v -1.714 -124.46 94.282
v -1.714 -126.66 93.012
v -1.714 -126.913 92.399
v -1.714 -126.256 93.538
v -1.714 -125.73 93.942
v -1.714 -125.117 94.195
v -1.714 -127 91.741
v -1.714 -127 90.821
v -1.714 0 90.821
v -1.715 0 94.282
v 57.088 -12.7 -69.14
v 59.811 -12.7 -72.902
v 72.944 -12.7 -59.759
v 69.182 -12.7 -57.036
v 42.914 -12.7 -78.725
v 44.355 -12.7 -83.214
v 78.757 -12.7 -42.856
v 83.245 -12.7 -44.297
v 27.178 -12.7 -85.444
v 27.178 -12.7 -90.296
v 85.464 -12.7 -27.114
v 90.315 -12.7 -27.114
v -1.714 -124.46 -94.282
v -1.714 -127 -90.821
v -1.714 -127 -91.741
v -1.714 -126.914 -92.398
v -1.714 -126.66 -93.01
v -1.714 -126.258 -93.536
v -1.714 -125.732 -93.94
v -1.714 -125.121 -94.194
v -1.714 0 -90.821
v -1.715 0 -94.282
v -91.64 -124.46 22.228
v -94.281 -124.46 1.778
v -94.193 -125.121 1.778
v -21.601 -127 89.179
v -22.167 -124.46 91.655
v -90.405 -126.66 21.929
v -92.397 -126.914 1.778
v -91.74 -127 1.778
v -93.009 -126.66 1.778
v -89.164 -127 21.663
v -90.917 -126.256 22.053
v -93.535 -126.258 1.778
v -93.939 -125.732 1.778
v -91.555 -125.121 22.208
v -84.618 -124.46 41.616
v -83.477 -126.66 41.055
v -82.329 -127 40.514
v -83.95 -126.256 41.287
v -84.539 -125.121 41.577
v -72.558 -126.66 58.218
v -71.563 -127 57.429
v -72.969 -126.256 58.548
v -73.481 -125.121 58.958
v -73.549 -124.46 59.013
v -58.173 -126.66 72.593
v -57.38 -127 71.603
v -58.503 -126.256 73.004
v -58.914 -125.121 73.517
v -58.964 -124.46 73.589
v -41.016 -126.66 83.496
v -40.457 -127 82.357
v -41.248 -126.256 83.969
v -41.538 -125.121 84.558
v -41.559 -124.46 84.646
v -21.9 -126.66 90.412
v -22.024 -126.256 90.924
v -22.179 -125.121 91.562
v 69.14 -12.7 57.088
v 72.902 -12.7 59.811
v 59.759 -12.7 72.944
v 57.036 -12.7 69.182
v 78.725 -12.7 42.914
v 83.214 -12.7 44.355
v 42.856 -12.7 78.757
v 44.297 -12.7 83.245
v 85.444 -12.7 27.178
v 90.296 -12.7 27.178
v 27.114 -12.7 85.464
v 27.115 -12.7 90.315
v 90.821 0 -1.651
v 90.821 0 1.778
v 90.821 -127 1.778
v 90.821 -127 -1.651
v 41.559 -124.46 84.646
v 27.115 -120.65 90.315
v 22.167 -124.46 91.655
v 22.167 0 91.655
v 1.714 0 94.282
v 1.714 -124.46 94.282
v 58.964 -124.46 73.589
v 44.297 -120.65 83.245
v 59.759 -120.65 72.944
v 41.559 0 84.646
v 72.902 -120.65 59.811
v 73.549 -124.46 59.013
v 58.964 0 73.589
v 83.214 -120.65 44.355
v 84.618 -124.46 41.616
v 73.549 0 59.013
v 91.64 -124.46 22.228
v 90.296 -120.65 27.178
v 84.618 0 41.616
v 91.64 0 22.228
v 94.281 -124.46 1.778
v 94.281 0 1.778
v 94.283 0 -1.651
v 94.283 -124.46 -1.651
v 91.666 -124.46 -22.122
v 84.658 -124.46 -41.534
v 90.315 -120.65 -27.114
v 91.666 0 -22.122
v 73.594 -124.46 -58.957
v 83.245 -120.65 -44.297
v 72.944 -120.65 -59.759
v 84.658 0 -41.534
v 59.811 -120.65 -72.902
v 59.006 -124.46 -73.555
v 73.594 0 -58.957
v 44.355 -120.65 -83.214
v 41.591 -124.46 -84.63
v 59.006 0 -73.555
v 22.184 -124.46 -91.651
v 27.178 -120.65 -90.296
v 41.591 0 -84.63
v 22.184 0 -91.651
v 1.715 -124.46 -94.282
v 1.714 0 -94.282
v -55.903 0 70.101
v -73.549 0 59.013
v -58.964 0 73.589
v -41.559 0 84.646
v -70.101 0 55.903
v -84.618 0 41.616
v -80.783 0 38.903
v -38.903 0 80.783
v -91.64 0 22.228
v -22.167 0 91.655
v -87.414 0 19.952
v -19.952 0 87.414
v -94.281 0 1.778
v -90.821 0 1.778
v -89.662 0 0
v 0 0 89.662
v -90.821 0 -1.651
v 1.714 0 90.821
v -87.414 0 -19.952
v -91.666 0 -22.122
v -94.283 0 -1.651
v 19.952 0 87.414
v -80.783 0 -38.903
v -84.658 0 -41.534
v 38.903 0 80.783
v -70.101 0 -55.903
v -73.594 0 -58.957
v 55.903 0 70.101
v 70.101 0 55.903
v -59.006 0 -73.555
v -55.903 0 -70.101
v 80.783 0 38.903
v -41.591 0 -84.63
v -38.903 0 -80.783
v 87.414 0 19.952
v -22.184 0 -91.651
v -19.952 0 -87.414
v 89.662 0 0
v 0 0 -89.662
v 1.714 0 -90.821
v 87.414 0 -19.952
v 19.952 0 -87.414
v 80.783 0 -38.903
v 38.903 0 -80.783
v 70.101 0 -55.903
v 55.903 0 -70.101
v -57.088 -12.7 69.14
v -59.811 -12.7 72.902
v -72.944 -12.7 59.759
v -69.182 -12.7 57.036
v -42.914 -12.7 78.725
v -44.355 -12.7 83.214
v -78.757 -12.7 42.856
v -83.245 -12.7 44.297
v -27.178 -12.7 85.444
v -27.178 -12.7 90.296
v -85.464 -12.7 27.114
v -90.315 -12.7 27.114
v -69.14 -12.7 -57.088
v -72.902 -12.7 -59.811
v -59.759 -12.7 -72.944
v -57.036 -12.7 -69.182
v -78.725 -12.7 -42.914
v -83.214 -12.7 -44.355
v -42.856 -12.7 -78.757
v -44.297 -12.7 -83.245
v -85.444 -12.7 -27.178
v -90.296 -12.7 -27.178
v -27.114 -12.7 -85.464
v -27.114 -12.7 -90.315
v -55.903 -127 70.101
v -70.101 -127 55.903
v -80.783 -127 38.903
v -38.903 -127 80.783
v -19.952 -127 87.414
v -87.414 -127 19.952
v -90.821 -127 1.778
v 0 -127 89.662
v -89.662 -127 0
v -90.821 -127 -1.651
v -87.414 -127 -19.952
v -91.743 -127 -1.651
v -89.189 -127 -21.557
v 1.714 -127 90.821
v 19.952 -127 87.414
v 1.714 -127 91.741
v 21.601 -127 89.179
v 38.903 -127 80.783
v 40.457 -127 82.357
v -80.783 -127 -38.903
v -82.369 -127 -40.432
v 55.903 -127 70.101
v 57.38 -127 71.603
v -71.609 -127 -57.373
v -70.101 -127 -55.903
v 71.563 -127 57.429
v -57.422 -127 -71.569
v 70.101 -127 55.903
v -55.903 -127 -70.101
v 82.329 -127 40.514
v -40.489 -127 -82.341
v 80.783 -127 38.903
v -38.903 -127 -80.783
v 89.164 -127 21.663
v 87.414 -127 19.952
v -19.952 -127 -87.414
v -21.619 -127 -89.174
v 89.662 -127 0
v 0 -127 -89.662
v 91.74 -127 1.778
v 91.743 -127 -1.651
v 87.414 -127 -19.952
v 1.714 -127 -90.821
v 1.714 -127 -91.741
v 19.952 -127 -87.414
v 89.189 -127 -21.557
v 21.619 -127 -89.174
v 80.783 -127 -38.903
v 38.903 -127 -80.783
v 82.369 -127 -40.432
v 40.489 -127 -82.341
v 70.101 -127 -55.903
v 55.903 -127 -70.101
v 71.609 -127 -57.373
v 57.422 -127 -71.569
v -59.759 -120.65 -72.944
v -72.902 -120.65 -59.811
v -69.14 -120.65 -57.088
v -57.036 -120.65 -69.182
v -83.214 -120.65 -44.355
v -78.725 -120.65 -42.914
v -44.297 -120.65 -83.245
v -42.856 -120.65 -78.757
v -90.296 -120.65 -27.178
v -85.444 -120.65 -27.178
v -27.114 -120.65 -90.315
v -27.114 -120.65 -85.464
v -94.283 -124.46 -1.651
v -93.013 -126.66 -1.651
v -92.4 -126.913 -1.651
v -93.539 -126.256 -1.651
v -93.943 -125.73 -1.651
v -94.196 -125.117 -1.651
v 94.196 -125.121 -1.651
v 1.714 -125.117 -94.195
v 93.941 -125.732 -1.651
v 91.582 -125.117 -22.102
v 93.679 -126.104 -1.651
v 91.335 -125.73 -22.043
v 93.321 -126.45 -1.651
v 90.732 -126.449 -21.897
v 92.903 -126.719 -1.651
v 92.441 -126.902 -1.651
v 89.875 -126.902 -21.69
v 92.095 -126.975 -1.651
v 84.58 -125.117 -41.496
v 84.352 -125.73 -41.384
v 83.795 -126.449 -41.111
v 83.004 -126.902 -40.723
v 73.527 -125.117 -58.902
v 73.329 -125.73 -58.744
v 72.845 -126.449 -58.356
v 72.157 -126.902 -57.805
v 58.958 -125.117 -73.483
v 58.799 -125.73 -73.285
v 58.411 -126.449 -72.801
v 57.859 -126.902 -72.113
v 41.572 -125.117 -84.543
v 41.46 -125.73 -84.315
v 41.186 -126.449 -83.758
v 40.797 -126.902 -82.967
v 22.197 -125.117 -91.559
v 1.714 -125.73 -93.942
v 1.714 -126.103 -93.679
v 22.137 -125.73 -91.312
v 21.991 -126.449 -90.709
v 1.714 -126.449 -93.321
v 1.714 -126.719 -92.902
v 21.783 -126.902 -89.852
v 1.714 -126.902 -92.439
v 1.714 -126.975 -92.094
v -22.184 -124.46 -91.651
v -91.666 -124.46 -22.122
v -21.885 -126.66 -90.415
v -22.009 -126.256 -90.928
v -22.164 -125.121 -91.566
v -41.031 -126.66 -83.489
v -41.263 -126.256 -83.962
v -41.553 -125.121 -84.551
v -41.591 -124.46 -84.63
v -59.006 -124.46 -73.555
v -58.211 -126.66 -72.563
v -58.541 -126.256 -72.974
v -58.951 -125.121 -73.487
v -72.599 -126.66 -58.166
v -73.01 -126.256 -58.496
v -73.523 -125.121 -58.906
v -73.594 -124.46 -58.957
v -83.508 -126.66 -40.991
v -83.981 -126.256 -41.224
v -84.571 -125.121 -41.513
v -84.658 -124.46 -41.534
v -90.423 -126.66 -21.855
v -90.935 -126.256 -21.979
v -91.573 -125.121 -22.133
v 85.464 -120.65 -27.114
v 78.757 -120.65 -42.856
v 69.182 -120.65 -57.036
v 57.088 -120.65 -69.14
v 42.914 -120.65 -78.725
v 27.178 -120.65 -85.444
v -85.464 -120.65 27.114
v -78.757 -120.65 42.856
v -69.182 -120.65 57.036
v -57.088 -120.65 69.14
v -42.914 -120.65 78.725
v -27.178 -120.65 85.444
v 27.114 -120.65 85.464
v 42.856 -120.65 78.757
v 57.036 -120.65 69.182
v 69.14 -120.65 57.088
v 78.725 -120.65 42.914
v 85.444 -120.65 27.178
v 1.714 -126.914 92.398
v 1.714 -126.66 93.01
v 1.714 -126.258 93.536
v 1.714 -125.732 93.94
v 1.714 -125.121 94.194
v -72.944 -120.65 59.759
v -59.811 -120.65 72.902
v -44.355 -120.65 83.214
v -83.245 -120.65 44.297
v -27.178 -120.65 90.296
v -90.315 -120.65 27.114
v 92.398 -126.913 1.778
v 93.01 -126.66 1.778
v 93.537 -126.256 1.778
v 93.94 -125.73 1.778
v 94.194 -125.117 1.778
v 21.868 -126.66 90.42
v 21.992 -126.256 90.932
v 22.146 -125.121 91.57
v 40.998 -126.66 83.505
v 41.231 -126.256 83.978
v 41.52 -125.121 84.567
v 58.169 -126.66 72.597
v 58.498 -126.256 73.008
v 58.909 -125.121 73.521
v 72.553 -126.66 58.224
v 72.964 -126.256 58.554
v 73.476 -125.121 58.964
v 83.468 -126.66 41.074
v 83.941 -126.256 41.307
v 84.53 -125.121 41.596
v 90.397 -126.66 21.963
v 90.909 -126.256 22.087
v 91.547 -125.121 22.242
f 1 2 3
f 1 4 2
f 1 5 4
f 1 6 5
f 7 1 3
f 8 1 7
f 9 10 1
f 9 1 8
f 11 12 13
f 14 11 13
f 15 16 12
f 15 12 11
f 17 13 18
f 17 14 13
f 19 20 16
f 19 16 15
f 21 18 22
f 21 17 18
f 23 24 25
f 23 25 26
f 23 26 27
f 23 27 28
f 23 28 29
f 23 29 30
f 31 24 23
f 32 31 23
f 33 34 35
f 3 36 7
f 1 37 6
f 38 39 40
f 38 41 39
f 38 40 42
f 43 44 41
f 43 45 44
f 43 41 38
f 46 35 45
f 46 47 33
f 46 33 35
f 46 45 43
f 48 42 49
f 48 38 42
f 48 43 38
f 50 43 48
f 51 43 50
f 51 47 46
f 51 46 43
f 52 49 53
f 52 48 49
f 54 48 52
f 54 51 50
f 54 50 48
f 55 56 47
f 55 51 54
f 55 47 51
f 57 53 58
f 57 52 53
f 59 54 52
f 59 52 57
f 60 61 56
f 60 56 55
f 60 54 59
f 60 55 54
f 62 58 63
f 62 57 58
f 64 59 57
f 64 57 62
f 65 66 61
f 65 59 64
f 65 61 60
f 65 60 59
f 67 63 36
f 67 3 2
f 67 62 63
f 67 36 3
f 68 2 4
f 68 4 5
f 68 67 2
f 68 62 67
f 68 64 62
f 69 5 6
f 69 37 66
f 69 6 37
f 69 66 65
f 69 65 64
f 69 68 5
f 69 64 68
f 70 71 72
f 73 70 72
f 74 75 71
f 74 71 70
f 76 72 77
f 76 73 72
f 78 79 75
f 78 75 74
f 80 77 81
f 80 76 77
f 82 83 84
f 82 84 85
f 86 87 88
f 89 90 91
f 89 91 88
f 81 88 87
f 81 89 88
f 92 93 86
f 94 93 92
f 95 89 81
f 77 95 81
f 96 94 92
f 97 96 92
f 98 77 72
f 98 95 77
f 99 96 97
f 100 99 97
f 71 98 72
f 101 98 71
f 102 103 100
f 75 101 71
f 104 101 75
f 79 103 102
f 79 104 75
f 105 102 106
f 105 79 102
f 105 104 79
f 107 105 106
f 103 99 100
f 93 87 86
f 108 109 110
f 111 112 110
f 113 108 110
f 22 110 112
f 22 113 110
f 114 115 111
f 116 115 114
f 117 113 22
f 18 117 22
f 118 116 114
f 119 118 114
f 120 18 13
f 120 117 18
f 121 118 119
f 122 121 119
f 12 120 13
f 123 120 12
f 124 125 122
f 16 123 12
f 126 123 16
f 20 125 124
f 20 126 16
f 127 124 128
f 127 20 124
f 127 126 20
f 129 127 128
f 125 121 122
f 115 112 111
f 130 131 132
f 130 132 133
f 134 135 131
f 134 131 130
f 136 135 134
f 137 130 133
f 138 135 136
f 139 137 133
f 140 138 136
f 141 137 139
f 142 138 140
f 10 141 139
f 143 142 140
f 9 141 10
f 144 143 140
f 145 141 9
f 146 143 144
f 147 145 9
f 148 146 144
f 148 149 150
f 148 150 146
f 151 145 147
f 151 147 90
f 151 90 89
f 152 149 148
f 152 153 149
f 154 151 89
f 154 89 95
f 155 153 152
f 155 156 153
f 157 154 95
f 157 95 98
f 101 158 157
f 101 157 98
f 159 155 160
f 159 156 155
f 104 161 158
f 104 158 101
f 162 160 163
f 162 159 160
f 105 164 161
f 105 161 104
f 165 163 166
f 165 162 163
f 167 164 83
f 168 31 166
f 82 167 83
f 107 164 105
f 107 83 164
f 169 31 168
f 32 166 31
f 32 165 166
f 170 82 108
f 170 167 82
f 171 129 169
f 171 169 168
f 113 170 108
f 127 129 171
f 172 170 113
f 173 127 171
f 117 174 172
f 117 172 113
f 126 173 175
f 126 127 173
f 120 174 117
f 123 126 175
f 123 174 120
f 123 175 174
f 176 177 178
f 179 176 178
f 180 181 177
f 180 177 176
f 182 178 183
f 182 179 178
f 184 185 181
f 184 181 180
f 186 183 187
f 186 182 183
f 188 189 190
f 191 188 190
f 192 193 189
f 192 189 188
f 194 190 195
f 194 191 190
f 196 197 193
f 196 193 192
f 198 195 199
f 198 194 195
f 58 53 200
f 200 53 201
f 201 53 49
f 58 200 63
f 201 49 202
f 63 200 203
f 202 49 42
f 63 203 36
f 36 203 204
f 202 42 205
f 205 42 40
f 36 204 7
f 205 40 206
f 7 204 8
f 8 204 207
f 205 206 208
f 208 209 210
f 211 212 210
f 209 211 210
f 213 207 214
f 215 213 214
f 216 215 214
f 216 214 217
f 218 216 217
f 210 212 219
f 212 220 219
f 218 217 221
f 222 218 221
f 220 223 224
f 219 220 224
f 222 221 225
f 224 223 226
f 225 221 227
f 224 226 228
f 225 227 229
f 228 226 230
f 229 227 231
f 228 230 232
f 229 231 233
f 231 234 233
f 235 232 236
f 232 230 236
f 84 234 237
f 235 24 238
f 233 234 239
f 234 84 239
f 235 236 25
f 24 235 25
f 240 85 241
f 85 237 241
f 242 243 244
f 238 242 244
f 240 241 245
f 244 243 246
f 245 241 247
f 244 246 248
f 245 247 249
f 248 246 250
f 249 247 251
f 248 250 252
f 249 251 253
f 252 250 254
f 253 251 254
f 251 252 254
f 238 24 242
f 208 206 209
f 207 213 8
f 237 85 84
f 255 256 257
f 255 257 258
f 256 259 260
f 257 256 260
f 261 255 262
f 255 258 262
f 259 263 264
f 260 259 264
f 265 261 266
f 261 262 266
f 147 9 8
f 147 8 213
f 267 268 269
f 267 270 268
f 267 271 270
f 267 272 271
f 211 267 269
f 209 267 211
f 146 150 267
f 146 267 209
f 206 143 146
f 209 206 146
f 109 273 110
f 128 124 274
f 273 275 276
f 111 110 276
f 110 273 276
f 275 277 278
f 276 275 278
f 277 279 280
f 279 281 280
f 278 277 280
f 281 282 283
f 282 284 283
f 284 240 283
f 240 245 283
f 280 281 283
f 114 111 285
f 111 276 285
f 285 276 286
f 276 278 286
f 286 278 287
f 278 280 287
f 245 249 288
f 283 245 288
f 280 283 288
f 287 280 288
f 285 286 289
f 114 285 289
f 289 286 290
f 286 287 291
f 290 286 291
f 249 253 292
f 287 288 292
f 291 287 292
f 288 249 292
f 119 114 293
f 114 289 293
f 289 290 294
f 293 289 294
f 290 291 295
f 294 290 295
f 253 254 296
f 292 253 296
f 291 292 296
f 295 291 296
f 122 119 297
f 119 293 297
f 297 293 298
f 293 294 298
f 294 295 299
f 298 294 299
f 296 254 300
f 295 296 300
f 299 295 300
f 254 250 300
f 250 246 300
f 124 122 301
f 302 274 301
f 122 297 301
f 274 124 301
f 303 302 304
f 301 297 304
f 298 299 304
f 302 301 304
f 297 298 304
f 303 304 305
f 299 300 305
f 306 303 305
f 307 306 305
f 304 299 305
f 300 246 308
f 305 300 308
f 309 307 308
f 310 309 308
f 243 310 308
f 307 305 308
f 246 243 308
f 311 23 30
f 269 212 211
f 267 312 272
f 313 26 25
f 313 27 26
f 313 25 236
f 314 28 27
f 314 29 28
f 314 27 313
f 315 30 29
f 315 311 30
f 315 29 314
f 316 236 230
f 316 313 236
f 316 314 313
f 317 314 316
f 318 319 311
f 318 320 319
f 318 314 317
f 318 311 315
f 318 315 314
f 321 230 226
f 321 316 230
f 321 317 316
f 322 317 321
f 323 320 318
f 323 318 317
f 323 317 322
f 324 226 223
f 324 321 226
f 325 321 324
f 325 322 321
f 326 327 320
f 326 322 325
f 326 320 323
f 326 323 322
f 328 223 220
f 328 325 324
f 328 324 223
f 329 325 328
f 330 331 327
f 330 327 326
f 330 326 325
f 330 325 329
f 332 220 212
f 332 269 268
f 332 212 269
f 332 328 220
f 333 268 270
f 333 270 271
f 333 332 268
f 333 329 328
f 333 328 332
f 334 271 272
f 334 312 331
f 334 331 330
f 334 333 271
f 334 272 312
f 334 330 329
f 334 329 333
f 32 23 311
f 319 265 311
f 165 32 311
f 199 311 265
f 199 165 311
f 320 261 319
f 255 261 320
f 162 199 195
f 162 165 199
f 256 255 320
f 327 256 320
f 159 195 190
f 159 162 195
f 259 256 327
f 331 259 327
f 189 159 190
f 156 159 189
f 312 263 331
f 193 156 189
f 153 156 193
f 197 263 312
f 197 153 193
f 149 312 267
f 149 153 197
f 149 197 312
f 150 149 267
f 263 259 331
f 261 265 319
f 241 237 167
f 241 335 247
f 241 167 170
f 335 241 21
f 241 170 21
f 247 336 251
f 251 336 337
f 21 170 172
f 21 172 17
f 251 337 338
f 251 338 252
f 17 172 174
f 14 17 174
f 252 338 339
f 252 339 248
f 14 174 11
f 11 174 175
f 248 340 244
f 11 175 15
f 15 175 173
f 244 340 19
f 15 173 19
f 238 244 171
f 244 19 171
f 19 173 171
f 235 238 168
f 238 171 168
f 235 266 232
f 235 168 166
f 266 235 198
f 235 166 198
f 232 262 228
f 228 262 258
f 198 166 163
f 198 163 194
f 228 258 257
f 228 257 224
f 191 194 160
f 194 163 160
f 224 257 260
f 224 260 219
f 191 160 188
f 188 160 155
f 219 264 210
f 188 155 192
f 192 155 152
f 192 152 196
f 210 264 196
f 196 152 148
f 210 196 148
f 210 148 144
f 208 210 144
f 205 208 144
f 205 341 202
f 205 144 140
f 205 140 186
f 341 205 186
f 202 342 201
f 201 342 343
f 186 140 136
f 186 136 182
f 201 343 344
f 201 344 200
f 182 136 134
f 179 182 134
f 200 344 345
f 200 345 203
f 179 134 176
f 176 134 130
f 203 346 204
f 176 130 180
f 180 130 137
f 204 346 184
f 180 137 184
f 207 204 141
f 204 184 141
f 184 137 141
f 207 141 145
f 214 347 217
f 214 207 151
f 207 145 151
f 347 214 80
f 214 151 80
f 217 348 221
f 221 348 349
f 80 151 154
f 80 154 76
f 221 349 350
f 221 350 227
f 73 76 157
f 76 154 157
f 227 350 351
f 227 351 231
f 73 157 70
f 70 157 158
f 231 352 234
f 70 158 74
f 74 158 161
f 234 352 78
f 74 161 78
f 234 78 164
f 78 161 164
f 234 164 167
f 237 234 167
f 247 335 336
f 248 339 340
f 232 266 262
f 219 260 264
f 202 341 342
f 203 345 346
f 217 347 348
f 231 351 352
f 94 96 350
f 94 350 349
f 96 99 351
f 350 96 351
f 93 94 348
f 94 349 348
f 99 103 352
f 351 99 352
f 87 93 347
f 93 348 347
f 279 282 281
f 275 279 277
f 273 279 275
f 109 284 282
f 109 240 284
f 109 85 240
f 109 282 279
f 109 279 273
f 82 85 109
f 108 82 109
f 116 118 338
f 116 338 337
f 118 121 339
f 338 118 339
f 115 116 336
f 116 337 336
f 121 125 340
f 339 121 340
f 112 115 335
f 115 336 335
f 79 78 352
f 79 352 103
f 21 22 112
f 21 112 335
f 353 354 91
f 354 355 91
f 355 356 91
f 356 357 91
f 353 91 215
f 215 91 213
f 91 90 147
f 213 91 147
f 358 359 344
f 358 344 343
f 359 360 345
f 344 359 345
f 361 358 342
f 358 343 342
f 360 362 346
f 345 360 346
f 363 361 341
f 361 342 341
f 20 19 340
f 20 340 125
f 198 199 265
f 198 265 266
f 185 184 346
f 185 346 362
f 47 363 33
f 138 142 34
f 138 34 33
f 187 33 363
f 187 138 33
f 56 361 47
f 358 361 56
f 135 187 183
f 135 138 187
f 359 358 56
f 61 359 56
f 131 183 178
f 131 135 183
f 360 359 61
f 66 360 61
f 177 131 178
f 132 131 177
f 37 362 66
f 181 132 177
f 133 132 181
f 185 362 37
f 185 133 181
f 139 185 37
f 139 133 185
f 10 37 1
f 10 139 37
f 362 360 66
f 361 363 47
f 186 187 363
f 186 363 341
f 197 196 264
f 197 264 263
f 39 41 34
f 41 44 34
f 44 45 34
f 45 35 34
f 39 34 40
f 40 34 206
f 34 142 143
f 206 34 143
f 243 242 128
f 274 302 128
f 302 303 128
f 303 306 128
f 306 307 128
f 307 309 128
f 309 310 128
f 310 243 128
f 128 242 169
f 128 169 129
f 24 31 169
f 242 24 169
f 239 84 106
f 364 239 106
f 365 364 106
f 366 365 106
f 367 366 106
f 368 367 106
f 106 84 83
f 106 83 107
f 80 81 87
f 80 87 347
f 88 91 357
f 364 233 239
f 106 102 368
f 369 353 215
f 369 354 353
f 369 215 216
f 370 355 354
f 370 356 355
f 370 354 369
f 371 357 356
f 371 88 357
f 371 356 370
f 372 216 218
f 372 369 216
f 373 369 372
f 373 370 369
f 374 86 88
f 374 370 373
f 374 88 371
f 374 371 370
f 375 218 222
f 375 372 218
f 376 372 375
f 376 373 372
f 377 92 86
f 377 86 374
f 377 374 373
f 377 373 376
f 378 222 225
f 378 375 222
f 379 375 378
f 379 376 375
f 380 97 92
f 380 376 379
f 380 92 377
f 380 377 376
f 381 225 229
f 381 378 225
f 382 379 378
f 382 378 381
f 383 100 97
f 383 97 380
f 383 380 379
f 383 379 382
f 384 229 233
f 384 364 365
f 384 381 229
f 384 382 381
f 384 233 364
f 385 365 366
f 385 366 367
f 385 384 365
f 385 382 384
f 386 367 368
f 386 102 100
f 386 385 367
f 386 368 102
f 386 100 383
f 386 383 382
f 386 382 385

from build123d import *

# Parameters (mm, degrees)
SKETCH1_R           = 94.2975
SKETCH1_R_2         = 89.662
BOSS_EXTRUDE1_DEPTH = 127
SKETCH5_W           = 3.429
SKETCH5_H           = 5.08
SKETCH5_W_2         = 5.08
SKETCH5_H_2         = 3.429
CUT_EXTRUDE1_DEPTH  = 127
CUT_EXTRUDE2_START  = -12.7
CUT_EXTRUDE2_DEPTH  = 107.95
CIRPATTERN1_COUNT   = 4
FILLET1_R           = 2.54


with BuildPart() as part:
    # Sketch1 → Boss-Extrude1 (new body)
    with BuildSketch(Plane(origin=(0, 0, 0), x_dir=(1, 0, 0), z_dir=(0, 1, 0))):
        Circle(SKETCH1_R)
        Circle(SKETCH1_R_2, mode=Mode.SUBTRACT)
    extrude(amount=-BOSS_EXTRUDE1_DEPTH)

    # Sketch5 → Cut-Extrude1 (cut)
    with BuildSketch(Plane(origin=(0, 0, 0), x_dir=(1, 0, 0), z_dir=(0, 1, 0))):
        with Locations((0, 93.360875)):
            Rectangle(SKETCH5_W, SKETCH5_H)
        with Locations((0, -93.360875)):
            Rectangle(SKETCH5_W, SKETCH5_H)
        with Locations((-93.360875, -0.0635)):
            Rectangle(SKETCH5_W_2, SKETCH5_H_2)
        with Locations((93.360875, -0.0635)):
            Rectangle(SKETCH5_W_2, SKETCH5_H_2)
    extrude(amount=-CUT_EXTRUDE1_DEPTH, mode=Mode.SUBTRACT)

    # Sketch7 → Cut-Extrude2 (cut)
    with BuildSketch(Plane(origin=(0, 0, 0), x_dir=(1, 0, 0), z_dir=(0, 1, 0)).offset(CUT_EXTRUDE2_START)):
        with BuildLine():
            Line((85.443727447, -27.178), (90.296039903, -27.178))
            ThreePointArc((90.296039903, -27.178), (66.654954519, -66.701840637), (27.1145, -90.315128279))
            Line((27.1145, -90.315128279), (27.1145, -85.463899594))
            ThreePointArc((27.1145, -85.463899594), (63.377047615, -63.424160063), (85.443727447, -27.178))
        make_face()
    cut_extrude2 = extrude(amount=-CUT_EXTRUDE2_DEPTH, mode=Mode.SUBTRACT)

    # CirPattern1: Cut-Extrude2 ×4 about axis
    cirpattern1_axis = Axis((0, 0, 0), (0, 1, 0))
    for i in range(1, CIRPATTERN1_COUNT):
        add(cut_extrude2.rotate(cirpattern1_axis, i * 360 / CIRPATTERN1_COUNT), mode=Mode.SUBTRACT)

    # Fillet1
    fillet1_edges = [part.edges().sort_by_distance(p)[0] for p in [
        (66.700852134, -127, -66.655943702),
        (-66.700852134, -127, -66.655943702),
        (-66.655943427, -127, 66.700852409),
        (66.655943427, -127, 66.700852409),
    ]]
    fillet(fillet1_edges, radius=FILLET1_R)


solid = part.part
